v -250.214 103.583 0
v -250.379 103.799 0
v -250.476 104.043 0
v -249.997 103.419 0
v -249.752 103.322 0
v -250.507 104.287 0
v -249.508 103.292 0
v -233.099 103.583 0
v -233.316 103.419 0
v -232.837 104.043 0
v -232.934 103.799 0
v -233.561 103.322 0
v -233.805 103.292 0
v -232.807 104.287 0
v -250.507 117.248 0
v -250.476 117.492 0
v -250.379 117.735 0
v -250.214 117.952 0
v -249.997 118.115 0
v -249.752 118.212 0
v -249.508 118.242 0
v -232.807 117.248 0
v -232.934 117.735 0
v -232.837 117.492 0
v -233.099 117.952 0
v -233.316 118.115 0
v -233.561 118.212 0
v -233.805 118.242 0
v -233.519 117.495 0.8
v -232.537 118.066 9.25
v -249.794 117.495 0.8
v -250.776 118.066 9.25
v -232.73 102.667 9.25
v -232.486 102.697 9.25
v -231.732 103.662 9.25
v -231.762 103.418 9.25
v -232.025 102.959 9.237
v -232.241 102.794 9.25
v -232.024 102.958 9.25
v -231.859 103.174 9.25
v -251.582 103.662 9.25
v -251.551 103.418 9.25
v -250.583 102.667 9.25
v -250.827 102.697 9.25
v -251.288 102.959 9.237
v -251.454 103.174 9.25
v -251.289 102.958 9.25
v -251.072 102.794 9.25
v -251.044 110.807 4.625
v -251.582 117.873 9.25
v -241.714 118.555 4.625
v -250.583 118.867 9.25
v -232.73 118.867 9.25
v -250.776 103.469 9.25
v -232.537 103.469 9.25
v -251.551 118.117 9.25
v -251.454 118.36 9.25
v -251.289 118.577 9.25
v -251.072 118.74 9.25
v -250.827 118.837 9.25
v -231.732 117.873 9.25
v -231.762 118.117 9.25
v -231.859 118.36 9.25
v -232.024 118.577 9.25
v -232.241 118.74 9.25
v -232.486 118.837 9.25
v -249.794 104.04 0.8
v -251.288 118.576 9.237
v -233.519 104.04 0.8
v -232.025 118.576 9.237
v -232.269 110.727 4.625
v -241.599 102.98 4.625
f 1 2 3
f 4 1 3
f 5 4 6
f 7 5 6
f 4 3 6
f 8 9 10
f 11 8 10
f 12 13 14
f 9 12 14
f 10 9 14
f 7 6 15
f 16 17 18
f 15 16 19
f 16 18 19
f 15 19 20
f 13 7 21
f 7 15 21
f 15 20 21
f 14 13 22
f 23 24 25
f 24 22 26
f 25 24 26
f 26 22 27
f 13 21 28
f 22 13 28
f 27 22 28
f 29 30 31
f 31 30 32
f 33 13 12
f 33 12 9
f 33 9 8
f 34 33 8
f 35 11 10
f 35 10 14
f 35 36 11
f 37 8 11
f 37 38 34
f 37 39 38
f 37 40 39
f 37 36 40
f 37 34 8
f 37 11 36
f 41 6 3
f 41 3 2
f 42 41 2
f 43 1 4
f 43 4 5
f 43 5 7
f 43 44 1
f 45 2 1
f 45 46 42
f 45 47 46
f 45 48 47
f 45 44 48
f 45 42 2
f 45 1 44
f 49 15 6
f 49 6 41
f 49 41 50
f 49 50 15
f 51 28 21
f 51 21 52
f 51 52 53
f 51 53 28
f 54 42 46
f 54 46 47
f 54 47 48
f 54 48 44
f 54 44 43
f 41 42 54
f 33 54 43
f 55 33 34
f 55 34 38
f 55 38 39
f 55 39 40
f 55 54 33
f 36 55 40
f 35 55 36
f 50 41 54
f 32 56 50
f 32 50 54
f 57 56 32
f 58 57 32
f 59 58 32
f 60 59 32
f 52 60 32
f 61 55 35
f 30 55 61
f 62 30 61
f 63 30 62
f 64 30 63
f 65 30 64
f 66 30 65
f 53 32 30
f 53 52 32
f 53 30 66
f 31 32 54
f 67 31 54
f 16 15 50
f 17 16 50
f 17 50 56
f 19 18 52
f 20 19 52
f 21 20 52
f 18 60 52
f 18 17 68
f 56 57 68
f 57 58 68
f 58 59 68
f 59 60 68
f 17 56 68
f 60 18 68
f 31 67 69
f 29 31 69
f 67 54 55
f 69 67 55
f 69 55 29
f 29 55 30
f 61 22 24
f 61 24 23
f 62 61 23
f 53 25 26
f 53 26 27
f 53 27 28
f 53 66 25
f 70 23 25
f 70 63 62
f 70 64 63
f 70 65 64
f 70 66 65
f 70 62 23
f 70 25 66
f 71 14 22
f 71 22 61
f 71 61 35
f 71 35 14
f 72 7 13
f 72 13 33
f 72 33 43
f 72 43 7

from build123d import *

# Parameters (mm, degrees)
F2_W = 17.7
F2_H = 14.95
F4_W = 19.85
F4_H = 16.2
F6_T = -0.8
F7_R = 1


with BuildPart() as f5:
    # F2 (on Top) → F5 section 0
    with BuildSketch(Plane.XY):
        with Locations((-241.6565716267, 110.767347253)):
            Rectangle(F2_W, F2_H)
    # F4 (on offset) → F5 section 1
    with BuildSketch(Plane.XY.offset(9.25)):
        with Locations((-241.6565716267, 110.767347253)):
            Rectangle(F4_W, F4_H)
    loft()

    # F6
    f6_openings = [f5.faces().sort_by_distance(p)[0] for p in [
        (-241.656572, 110.767347, 9.25),
    ]]
    offset(amount=F6_T, openings=f6_openings)

    # F7
    f7_edges = [f5.edges().sort_by_distance(p)[0] for p in [
        (-251.044072, 102.979847, 4.625),
        (-232.269072, 102.979847, 4.625),
        (-232.269072, 118.554847, 4.625),
        (-251.044072, 118.554847, 4.625),
    ]]
    fillet(f7_edges, radius=F7_R)


solid = f5.part
